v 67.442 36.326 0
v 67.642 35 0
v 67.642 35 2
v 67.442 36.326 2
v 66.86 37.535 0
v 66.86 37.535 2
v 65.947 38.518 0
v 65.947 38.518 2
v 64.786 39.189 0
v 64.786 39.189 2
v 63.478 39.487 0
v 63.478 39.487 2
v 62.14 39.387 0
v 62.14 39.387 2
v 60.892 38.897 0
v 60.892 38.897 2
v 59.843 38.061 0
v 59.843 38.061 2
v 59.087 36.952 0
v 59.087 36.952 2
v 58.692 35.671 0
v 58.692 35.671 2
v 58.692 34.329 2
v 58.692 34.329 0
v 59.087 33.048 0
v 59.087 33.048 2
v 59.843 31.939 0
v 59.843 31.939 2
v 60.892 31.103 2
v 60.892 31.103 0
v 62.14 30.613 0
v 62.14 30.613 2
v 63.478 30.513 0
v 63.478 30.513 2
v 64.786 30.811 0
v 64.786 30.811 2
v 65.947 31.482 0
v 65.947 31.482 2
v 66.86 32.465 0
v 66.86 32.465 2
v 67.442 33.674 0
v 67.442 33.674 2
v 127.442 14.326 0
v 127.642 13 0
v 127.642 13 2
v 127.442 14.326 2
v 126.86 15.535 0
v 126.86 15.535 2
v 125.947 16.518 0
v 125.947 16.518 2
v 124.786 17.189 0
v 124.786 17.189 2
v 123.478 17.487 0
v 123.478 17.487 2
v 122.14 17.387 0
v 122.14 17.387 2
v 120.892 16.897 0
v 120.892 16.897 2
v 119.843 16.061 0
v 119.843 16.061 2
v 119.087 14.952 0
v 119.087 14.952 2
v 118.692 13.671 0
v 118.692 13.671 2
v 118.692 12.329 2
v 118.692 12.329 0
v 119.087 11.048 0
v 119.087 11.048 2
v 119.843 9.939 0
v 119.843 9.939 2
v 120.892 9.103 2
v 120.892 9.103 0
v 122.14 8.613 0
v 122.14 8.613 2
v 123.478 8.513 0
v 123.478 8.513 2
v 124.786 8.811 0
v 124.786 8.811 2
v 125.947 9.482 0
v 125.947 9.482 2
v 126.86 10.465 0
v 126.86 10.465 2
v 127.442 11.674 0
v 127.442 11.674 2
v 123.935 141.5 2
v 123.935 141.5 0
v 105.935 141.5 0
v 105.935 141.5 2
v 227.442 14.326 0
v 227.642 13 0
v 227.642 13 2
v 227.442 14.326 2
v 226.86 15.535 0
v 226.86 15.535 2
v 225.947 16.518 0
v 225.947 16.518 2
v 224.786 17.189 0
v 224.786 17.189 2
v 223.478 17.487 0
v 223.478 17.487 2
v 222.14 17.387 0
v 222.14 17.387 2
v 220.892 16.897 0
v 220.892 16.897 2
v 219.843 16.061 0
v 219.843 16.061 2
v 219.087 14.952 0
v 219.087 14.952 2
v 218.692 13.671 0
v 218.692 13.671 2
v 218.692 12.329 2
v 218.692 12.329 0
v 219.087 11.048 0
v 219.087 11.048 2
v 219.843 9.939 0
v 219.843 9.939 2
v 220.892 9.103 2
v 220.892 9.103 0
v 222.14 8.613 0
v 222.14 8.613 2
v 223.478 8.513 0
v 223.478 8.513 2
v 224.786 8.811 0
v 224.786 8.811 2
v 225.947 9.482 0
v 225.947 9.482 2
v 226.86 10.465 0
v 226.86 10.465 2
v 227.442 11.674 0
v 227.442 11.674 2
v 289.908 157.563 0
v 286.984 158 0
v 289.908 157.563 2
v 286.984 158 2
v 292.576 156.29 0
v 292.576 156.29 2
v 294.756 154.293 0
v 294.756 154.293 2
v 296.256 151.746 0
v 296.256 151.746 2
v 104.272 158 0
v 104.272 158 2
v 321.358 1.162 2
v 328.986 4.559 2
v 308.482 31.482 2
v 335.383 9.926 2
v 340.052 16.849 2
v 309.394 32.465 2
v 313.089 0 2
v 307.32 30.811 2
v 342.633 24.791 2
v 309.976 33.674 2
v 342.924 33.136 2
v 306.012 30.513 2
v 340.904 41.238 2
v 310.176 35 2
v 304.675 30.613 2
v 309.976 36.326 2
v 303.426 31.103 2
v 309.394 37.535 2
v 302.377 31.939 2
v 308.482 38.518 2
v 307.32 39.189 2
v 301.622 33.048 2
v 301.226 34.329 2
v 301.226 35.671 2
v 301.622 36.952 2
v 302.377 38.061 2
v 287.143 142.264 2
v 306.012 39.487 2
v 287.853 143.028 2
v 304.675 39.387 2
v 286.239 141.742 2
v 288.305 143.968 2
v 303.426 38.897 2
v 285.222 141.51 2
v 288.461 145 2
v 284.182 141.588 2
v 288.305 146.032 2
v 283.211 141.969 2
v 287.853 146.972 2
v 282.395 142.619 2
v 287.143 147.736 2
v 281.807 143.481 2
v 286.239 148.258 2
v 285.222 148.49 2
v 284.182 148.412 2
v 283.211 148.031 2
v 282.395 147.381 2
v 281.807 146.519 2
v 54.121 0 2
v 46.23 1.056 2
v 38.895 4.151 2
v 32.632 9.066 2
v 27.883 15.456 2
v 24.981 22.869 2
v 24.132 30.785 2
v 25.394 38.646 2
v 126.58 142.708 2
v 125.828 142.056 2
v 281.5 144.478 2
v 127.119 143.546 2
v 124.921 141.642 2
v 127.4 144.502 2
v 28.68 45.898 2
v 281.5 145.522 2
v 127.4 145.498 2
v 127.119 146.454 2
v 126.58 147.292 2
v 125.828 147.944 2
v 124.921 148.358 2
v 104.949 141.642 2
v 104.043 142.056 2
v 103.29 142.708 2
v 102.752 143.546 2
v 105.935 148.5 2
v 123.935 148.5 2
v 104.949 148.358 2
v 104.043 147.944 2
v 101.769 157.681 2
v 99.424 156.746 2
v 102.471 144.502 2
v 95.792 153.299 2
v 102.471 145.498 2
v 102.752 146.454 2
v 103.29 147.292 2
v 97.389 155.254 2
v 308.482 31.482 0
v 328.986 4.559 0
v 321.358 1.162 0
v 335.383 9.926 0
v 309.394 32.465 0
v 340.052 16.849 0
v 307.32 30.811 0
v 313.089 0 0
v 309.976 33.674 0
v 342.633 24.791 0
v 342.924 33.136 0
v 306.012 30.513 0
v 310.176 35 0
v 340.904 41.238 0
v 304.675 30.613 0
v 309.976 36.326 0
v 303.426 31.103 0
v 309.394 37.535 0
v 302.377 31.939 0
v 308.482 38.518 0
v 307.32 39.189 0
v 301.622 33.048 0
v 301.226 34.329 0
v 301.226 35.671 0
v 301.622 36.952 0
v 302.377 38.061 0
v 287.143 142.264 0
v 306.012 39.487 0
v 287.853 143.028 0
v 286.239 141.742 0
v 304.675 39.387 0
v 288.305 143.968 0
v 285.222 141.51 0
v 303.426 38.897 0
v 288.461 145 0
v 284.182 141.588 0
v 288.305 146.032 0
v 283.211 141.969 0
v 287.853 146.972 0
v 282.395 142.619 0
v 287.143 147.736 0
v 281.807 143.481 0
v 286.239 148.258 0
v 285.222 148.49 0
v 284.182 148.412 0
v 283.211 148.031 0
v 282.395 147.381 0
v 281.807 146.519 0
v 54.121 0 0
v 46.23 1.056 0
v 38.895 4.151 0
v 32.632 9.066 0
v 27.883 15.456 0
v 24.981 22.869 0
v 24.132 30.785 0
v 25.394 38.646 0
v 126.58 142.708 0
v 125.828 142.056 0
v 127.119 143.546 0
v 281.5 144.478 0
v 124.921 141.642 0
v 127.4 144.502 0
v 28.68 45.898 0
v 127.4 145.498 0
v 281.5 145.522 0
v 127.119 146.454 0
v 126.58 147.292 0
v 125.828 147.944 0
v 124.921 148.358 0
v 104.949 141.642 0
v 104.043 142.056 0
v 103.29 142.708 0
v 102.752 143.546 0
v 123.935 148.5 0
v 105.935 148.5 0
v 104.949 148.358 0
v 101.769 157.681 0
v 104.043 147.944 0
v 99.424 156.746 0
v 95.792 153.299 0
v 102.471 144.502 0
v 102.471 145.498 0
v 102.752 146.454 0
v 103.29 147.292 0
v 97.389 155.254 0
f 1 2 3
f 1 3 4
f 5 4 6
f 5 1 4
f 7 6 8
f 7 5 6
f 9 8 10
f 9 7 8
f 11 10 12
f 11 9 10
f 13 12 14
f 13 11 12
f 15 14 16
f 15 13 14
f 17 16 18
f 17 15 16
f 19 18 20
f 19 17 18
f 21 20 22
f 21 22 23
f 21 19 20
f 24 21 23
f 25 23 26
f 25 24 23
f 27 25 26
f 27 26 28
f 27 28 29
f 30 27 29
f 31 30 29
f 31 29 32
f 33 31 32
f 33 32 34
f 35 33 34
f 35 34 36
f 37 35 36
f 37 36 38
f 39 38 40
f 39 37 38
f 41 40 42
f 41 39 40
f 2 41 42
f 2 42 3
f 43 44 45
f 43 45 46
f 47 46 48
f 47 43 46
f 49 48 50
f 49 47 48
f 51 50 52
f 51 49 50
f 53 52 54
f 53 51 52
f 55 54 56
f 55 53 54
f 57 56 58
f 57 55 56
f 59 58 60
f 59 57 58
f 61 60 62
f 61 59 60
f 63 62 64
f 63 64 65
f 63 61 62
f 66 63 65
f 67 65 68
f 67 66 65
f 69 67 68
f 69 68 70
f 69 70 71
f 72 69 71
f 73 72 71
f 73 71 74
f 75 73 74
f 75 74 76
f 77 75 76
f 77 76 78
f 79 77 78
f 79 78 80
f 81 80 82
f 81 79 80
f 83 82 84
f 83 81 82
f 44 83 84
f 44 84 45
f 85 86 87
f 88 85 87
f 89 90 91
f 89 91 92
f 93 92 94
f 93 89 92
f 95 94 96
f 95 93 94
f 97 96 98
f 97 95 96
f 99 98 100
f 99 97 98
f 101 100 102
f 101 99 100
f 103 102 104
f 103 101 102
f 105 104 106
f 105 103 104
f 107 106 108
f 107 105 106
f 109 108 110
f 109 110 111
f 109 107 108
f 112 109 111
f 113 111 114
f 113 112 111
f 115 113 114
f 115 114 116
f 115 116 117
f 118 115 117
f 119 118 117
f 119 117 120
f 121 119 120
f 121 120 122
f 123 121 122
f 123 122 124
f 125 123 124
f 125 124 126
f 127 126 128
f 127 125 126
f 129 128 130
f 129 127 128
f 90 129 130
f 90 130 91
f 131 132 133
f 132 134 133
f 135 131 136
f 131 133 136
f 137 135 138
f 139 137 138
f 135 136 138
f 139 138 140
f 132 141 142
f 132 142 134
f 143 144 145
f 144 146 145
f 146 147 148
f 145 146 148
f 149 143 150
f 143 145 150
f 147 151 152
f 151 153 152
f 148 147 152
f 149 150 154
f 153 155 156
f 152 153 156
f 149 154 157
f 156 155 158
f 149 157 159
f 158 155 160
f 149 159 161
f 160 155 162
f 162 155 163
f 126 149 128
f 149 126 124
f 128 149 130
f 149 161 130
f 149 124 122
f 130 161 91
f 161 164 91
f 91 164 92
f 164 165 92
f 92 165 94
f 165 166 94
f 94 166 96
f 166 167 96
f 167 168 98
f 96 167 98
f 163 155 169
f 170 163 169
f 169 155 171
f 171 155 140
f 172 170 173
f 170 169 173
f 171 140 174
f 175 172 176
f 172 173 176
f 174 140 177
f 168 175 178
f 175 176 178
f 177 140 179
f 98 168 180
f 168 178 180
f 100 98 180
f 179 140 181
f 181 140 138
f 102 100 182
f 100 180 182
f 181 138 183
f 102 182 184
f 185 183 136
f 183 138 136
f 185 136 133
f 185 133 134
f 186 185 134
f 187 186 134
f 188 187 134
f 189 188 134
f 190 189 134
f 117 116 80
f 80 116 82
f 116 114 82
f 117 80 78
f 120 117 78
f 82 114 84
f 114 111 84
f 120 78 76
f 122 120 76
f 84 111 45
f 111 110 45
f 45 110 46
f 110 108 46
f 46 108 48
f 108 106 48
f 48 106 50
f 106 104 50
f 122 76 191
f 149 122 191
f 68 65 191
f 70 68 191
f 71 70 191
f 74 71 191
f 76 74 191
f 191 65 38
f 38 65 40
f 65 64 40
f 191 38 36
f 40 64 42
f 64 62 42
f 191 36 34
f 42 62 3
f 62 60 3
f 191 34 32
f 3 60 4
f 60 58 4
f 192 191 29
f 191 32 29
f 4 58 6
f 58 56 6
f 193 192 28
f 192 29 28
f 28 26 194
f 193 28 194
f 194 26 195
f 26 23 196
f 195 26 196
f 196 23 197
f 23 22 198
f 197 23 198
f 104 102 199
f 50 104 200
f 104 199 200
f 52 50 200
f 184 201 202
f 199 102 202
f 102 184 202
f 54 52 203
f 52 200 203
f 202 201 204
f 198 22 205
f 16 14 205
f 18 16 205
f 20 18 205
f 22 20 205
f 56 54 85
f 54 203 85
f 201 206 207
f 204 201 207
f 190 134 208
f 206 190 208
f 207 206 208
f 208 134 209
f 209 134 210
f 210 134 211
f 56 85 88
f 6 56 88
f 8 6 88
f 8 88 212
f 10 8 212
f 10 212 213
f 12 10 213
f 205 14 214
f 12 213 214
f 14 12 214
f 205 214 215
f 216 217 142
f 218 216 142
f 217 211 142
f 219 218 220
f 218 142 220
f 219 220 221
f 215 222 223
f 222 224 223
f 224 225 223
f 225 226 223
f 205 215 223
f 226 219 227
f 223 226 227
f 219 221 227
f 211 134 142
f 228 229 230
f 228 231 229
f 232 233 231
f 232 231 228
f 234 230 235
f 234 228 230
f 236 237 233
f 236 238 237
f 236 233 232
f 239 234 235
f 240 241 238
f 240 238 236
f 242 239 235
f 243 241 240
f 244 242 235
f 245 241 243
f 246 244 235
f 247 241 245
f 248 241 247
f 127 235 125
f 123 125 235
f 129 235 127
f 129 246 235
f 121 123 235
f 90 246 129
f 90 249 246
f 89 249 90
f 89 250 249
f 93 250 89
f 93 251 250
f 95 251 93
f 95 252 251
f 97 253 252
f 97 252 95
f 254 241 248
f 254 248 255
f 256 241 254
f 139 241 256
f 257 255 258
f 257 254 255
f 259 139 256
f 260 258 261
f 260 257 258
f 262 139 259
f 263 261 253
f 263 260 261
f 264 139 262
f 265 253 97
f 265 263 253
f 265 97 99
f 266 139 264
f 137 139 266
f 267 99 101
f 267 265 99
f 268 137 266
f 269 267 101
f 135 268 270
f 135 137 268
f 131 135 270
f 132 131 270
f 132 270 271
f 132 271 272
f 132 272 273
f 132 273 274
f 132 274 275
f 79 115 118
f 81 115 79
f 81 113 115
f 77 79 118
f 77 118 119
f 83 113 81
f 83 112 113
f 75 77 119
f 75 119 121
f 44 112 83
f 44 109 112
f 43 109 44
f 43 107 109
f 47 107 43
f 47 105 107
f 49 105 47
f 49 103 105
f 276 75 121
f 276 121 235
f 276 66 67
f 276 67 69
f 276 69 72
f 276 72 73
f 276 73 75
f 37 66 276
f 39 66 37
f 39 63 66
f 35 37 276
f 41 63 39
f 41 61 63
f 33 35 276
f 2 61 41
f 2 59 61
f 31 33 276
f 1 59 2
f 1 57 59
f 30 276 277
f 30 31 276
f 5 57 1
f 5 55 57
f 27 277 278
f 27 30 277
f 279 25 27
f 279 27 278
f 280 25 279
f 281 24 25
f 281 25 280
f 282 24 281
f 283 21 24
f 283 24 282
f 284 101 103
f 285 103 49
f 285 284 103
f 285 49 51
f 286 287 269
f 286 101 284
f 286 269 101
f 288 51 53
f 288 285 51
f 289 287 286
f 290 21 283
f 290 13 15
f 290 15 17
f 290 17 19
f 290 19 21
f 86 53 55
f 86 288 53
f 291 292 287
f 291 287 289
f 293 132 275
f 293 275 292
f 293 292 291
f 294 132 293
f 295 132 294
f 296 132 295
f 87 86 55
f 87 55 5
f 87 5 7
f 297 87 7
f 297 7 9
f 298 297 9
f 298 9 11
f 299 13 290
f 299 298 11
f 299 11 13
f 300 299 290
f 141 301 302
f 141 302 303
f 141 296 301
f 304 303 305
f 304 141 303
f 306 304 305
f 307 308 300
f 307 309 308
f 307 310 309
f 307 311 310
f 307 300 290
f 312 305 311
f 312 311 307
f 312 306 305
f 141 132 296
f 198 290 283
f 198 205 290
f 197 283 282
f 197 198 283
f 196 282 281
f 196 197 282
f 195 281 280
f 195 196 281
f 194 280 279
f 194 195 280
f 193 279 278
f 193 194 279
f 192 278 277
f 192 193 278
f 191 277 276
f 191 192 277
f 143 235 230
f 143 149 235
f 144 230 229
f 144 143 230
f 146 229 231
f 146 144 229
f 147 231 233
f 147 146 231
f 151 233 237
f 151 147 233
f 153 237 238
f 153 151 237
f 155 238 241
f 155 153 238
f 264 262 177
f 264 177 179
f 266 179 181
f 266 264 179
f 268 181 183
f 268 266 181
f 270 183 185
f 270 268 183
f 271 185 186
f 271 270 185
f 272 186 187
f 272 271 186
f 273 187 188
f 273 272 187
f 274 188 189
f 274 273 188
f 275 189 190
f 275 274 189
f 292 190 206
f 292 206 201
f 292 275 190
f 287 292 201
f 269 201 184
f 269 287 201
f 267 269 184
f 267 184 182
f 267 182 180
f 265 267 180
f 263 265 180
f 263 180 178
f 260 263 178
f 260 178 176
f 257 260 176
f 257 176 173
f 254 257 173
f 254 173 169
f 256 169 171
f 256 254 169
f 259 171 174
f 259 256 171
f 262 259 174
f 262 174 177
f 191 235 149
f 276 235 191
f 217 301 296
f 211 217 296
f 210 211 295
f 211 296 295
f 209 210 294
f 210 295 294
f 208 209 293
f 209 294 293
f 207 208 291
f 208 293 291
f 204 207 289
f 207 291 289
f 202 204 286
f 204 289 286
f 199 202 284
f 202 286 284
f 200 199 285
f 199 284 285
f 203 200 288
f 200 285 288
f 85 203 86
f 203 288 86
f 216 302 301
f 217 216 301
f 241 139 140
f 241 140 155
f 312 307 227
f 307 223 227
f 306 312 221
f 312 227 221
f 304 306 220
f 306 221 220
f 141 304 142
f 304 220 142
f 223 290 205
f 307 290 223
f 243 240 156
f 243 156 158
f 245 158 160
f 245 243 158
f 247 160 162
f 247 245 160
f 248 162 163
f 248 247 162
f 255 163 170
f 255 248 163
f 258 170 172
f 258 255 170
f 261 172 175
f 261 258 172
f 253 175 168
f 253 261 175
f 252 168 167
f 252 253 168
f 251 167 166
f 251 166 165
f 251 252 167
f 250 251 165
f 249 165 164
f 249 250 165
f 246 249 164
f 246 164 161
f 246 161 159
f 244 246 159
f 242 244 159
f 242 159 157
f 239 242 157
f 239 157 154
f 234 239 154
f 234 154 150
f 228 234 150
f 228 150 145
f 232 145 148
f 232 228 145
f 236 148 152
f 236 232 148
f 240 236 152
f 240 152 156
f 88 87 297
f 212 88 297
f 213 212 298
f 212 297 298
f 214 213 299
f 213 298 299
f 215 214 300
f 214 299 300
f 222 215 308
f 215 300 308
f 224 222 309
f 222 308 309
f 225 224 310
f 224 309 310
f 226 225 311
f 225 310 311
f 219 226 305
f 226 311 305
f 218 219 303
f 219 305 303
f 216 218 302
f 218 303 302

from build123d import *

# Parameters (mm, degrees)
SKETCH1_R           = 3.5
SKETCH1_R_2         = 4.5
BOSS_EXTRUDE1_DEPTH = 2
FILLET1_R           = 30
FILLET2_R           = 10


with BuildPart() as part:
    # Sketch1 → Boss-Extrude1 (new body)
    with BuildSketch(Plane.XY):
        Polygon((0, 0), (98.729357602, 158), (293.729357602, 158), (357.565501284, 0), align=None)
        with Locations((284.960746883, 145)):
            Circle(SKETCH1_R, mode=Mode.SUBTRACT)
        with Locations((305.675867386, 35)):
            Circle(SKETCH1_R_2, mode=Mode.SUBTRACT)
        with Locations((63.141671434, 35)):
            Circle(SKETCH1_R_2, mode=Mode.SUBTRACT)
        with Locations((123.141671434, 13)):
            Circle(SKETCH1_R_2, mode=Mode.SUBTRACT)
        with Locations((223.141671434, 13)):
            Circle(SKETCH1_R_2, mode=Mode.SUBTRACT)
        with BuildLine():
            Line((105.935375271, 148.5), (123.935375271, 148.5))
            ThreePointArc((123.935375271, 148.5), (127.435375271, 145), (123.935375271, 141.5))
            Line((123.935375271, 141.5), (105.935375271, 141.5))
            ThreePointArc((105.935375271, 141.5), (102.435375271, 145), (105.935375271, 148.5))
        make_face(mode=Mode.SUBTRACT)
    extrude(amount=BOSS_EXTRUDE1_DEPTH)

    # Fillet1
    fillet1_edges = [part.edges().sort_by_distance(p)[0] for p in [
        (0, 0, 1),
        (357.565501284, 0, 1),
    ]]
    fillet(fillet1_edges, radius=FILLET1_R)

    # Fillet2
    fillet2_edges = [part.edges().sort_by_distance(p)[0] for p in [
        (98.729357602, 158, 1),
        (293.729357602, 158, 1),
    ]]
    fillet(fillet2_edges, radius=FILLET2_R)


solid = part.part
